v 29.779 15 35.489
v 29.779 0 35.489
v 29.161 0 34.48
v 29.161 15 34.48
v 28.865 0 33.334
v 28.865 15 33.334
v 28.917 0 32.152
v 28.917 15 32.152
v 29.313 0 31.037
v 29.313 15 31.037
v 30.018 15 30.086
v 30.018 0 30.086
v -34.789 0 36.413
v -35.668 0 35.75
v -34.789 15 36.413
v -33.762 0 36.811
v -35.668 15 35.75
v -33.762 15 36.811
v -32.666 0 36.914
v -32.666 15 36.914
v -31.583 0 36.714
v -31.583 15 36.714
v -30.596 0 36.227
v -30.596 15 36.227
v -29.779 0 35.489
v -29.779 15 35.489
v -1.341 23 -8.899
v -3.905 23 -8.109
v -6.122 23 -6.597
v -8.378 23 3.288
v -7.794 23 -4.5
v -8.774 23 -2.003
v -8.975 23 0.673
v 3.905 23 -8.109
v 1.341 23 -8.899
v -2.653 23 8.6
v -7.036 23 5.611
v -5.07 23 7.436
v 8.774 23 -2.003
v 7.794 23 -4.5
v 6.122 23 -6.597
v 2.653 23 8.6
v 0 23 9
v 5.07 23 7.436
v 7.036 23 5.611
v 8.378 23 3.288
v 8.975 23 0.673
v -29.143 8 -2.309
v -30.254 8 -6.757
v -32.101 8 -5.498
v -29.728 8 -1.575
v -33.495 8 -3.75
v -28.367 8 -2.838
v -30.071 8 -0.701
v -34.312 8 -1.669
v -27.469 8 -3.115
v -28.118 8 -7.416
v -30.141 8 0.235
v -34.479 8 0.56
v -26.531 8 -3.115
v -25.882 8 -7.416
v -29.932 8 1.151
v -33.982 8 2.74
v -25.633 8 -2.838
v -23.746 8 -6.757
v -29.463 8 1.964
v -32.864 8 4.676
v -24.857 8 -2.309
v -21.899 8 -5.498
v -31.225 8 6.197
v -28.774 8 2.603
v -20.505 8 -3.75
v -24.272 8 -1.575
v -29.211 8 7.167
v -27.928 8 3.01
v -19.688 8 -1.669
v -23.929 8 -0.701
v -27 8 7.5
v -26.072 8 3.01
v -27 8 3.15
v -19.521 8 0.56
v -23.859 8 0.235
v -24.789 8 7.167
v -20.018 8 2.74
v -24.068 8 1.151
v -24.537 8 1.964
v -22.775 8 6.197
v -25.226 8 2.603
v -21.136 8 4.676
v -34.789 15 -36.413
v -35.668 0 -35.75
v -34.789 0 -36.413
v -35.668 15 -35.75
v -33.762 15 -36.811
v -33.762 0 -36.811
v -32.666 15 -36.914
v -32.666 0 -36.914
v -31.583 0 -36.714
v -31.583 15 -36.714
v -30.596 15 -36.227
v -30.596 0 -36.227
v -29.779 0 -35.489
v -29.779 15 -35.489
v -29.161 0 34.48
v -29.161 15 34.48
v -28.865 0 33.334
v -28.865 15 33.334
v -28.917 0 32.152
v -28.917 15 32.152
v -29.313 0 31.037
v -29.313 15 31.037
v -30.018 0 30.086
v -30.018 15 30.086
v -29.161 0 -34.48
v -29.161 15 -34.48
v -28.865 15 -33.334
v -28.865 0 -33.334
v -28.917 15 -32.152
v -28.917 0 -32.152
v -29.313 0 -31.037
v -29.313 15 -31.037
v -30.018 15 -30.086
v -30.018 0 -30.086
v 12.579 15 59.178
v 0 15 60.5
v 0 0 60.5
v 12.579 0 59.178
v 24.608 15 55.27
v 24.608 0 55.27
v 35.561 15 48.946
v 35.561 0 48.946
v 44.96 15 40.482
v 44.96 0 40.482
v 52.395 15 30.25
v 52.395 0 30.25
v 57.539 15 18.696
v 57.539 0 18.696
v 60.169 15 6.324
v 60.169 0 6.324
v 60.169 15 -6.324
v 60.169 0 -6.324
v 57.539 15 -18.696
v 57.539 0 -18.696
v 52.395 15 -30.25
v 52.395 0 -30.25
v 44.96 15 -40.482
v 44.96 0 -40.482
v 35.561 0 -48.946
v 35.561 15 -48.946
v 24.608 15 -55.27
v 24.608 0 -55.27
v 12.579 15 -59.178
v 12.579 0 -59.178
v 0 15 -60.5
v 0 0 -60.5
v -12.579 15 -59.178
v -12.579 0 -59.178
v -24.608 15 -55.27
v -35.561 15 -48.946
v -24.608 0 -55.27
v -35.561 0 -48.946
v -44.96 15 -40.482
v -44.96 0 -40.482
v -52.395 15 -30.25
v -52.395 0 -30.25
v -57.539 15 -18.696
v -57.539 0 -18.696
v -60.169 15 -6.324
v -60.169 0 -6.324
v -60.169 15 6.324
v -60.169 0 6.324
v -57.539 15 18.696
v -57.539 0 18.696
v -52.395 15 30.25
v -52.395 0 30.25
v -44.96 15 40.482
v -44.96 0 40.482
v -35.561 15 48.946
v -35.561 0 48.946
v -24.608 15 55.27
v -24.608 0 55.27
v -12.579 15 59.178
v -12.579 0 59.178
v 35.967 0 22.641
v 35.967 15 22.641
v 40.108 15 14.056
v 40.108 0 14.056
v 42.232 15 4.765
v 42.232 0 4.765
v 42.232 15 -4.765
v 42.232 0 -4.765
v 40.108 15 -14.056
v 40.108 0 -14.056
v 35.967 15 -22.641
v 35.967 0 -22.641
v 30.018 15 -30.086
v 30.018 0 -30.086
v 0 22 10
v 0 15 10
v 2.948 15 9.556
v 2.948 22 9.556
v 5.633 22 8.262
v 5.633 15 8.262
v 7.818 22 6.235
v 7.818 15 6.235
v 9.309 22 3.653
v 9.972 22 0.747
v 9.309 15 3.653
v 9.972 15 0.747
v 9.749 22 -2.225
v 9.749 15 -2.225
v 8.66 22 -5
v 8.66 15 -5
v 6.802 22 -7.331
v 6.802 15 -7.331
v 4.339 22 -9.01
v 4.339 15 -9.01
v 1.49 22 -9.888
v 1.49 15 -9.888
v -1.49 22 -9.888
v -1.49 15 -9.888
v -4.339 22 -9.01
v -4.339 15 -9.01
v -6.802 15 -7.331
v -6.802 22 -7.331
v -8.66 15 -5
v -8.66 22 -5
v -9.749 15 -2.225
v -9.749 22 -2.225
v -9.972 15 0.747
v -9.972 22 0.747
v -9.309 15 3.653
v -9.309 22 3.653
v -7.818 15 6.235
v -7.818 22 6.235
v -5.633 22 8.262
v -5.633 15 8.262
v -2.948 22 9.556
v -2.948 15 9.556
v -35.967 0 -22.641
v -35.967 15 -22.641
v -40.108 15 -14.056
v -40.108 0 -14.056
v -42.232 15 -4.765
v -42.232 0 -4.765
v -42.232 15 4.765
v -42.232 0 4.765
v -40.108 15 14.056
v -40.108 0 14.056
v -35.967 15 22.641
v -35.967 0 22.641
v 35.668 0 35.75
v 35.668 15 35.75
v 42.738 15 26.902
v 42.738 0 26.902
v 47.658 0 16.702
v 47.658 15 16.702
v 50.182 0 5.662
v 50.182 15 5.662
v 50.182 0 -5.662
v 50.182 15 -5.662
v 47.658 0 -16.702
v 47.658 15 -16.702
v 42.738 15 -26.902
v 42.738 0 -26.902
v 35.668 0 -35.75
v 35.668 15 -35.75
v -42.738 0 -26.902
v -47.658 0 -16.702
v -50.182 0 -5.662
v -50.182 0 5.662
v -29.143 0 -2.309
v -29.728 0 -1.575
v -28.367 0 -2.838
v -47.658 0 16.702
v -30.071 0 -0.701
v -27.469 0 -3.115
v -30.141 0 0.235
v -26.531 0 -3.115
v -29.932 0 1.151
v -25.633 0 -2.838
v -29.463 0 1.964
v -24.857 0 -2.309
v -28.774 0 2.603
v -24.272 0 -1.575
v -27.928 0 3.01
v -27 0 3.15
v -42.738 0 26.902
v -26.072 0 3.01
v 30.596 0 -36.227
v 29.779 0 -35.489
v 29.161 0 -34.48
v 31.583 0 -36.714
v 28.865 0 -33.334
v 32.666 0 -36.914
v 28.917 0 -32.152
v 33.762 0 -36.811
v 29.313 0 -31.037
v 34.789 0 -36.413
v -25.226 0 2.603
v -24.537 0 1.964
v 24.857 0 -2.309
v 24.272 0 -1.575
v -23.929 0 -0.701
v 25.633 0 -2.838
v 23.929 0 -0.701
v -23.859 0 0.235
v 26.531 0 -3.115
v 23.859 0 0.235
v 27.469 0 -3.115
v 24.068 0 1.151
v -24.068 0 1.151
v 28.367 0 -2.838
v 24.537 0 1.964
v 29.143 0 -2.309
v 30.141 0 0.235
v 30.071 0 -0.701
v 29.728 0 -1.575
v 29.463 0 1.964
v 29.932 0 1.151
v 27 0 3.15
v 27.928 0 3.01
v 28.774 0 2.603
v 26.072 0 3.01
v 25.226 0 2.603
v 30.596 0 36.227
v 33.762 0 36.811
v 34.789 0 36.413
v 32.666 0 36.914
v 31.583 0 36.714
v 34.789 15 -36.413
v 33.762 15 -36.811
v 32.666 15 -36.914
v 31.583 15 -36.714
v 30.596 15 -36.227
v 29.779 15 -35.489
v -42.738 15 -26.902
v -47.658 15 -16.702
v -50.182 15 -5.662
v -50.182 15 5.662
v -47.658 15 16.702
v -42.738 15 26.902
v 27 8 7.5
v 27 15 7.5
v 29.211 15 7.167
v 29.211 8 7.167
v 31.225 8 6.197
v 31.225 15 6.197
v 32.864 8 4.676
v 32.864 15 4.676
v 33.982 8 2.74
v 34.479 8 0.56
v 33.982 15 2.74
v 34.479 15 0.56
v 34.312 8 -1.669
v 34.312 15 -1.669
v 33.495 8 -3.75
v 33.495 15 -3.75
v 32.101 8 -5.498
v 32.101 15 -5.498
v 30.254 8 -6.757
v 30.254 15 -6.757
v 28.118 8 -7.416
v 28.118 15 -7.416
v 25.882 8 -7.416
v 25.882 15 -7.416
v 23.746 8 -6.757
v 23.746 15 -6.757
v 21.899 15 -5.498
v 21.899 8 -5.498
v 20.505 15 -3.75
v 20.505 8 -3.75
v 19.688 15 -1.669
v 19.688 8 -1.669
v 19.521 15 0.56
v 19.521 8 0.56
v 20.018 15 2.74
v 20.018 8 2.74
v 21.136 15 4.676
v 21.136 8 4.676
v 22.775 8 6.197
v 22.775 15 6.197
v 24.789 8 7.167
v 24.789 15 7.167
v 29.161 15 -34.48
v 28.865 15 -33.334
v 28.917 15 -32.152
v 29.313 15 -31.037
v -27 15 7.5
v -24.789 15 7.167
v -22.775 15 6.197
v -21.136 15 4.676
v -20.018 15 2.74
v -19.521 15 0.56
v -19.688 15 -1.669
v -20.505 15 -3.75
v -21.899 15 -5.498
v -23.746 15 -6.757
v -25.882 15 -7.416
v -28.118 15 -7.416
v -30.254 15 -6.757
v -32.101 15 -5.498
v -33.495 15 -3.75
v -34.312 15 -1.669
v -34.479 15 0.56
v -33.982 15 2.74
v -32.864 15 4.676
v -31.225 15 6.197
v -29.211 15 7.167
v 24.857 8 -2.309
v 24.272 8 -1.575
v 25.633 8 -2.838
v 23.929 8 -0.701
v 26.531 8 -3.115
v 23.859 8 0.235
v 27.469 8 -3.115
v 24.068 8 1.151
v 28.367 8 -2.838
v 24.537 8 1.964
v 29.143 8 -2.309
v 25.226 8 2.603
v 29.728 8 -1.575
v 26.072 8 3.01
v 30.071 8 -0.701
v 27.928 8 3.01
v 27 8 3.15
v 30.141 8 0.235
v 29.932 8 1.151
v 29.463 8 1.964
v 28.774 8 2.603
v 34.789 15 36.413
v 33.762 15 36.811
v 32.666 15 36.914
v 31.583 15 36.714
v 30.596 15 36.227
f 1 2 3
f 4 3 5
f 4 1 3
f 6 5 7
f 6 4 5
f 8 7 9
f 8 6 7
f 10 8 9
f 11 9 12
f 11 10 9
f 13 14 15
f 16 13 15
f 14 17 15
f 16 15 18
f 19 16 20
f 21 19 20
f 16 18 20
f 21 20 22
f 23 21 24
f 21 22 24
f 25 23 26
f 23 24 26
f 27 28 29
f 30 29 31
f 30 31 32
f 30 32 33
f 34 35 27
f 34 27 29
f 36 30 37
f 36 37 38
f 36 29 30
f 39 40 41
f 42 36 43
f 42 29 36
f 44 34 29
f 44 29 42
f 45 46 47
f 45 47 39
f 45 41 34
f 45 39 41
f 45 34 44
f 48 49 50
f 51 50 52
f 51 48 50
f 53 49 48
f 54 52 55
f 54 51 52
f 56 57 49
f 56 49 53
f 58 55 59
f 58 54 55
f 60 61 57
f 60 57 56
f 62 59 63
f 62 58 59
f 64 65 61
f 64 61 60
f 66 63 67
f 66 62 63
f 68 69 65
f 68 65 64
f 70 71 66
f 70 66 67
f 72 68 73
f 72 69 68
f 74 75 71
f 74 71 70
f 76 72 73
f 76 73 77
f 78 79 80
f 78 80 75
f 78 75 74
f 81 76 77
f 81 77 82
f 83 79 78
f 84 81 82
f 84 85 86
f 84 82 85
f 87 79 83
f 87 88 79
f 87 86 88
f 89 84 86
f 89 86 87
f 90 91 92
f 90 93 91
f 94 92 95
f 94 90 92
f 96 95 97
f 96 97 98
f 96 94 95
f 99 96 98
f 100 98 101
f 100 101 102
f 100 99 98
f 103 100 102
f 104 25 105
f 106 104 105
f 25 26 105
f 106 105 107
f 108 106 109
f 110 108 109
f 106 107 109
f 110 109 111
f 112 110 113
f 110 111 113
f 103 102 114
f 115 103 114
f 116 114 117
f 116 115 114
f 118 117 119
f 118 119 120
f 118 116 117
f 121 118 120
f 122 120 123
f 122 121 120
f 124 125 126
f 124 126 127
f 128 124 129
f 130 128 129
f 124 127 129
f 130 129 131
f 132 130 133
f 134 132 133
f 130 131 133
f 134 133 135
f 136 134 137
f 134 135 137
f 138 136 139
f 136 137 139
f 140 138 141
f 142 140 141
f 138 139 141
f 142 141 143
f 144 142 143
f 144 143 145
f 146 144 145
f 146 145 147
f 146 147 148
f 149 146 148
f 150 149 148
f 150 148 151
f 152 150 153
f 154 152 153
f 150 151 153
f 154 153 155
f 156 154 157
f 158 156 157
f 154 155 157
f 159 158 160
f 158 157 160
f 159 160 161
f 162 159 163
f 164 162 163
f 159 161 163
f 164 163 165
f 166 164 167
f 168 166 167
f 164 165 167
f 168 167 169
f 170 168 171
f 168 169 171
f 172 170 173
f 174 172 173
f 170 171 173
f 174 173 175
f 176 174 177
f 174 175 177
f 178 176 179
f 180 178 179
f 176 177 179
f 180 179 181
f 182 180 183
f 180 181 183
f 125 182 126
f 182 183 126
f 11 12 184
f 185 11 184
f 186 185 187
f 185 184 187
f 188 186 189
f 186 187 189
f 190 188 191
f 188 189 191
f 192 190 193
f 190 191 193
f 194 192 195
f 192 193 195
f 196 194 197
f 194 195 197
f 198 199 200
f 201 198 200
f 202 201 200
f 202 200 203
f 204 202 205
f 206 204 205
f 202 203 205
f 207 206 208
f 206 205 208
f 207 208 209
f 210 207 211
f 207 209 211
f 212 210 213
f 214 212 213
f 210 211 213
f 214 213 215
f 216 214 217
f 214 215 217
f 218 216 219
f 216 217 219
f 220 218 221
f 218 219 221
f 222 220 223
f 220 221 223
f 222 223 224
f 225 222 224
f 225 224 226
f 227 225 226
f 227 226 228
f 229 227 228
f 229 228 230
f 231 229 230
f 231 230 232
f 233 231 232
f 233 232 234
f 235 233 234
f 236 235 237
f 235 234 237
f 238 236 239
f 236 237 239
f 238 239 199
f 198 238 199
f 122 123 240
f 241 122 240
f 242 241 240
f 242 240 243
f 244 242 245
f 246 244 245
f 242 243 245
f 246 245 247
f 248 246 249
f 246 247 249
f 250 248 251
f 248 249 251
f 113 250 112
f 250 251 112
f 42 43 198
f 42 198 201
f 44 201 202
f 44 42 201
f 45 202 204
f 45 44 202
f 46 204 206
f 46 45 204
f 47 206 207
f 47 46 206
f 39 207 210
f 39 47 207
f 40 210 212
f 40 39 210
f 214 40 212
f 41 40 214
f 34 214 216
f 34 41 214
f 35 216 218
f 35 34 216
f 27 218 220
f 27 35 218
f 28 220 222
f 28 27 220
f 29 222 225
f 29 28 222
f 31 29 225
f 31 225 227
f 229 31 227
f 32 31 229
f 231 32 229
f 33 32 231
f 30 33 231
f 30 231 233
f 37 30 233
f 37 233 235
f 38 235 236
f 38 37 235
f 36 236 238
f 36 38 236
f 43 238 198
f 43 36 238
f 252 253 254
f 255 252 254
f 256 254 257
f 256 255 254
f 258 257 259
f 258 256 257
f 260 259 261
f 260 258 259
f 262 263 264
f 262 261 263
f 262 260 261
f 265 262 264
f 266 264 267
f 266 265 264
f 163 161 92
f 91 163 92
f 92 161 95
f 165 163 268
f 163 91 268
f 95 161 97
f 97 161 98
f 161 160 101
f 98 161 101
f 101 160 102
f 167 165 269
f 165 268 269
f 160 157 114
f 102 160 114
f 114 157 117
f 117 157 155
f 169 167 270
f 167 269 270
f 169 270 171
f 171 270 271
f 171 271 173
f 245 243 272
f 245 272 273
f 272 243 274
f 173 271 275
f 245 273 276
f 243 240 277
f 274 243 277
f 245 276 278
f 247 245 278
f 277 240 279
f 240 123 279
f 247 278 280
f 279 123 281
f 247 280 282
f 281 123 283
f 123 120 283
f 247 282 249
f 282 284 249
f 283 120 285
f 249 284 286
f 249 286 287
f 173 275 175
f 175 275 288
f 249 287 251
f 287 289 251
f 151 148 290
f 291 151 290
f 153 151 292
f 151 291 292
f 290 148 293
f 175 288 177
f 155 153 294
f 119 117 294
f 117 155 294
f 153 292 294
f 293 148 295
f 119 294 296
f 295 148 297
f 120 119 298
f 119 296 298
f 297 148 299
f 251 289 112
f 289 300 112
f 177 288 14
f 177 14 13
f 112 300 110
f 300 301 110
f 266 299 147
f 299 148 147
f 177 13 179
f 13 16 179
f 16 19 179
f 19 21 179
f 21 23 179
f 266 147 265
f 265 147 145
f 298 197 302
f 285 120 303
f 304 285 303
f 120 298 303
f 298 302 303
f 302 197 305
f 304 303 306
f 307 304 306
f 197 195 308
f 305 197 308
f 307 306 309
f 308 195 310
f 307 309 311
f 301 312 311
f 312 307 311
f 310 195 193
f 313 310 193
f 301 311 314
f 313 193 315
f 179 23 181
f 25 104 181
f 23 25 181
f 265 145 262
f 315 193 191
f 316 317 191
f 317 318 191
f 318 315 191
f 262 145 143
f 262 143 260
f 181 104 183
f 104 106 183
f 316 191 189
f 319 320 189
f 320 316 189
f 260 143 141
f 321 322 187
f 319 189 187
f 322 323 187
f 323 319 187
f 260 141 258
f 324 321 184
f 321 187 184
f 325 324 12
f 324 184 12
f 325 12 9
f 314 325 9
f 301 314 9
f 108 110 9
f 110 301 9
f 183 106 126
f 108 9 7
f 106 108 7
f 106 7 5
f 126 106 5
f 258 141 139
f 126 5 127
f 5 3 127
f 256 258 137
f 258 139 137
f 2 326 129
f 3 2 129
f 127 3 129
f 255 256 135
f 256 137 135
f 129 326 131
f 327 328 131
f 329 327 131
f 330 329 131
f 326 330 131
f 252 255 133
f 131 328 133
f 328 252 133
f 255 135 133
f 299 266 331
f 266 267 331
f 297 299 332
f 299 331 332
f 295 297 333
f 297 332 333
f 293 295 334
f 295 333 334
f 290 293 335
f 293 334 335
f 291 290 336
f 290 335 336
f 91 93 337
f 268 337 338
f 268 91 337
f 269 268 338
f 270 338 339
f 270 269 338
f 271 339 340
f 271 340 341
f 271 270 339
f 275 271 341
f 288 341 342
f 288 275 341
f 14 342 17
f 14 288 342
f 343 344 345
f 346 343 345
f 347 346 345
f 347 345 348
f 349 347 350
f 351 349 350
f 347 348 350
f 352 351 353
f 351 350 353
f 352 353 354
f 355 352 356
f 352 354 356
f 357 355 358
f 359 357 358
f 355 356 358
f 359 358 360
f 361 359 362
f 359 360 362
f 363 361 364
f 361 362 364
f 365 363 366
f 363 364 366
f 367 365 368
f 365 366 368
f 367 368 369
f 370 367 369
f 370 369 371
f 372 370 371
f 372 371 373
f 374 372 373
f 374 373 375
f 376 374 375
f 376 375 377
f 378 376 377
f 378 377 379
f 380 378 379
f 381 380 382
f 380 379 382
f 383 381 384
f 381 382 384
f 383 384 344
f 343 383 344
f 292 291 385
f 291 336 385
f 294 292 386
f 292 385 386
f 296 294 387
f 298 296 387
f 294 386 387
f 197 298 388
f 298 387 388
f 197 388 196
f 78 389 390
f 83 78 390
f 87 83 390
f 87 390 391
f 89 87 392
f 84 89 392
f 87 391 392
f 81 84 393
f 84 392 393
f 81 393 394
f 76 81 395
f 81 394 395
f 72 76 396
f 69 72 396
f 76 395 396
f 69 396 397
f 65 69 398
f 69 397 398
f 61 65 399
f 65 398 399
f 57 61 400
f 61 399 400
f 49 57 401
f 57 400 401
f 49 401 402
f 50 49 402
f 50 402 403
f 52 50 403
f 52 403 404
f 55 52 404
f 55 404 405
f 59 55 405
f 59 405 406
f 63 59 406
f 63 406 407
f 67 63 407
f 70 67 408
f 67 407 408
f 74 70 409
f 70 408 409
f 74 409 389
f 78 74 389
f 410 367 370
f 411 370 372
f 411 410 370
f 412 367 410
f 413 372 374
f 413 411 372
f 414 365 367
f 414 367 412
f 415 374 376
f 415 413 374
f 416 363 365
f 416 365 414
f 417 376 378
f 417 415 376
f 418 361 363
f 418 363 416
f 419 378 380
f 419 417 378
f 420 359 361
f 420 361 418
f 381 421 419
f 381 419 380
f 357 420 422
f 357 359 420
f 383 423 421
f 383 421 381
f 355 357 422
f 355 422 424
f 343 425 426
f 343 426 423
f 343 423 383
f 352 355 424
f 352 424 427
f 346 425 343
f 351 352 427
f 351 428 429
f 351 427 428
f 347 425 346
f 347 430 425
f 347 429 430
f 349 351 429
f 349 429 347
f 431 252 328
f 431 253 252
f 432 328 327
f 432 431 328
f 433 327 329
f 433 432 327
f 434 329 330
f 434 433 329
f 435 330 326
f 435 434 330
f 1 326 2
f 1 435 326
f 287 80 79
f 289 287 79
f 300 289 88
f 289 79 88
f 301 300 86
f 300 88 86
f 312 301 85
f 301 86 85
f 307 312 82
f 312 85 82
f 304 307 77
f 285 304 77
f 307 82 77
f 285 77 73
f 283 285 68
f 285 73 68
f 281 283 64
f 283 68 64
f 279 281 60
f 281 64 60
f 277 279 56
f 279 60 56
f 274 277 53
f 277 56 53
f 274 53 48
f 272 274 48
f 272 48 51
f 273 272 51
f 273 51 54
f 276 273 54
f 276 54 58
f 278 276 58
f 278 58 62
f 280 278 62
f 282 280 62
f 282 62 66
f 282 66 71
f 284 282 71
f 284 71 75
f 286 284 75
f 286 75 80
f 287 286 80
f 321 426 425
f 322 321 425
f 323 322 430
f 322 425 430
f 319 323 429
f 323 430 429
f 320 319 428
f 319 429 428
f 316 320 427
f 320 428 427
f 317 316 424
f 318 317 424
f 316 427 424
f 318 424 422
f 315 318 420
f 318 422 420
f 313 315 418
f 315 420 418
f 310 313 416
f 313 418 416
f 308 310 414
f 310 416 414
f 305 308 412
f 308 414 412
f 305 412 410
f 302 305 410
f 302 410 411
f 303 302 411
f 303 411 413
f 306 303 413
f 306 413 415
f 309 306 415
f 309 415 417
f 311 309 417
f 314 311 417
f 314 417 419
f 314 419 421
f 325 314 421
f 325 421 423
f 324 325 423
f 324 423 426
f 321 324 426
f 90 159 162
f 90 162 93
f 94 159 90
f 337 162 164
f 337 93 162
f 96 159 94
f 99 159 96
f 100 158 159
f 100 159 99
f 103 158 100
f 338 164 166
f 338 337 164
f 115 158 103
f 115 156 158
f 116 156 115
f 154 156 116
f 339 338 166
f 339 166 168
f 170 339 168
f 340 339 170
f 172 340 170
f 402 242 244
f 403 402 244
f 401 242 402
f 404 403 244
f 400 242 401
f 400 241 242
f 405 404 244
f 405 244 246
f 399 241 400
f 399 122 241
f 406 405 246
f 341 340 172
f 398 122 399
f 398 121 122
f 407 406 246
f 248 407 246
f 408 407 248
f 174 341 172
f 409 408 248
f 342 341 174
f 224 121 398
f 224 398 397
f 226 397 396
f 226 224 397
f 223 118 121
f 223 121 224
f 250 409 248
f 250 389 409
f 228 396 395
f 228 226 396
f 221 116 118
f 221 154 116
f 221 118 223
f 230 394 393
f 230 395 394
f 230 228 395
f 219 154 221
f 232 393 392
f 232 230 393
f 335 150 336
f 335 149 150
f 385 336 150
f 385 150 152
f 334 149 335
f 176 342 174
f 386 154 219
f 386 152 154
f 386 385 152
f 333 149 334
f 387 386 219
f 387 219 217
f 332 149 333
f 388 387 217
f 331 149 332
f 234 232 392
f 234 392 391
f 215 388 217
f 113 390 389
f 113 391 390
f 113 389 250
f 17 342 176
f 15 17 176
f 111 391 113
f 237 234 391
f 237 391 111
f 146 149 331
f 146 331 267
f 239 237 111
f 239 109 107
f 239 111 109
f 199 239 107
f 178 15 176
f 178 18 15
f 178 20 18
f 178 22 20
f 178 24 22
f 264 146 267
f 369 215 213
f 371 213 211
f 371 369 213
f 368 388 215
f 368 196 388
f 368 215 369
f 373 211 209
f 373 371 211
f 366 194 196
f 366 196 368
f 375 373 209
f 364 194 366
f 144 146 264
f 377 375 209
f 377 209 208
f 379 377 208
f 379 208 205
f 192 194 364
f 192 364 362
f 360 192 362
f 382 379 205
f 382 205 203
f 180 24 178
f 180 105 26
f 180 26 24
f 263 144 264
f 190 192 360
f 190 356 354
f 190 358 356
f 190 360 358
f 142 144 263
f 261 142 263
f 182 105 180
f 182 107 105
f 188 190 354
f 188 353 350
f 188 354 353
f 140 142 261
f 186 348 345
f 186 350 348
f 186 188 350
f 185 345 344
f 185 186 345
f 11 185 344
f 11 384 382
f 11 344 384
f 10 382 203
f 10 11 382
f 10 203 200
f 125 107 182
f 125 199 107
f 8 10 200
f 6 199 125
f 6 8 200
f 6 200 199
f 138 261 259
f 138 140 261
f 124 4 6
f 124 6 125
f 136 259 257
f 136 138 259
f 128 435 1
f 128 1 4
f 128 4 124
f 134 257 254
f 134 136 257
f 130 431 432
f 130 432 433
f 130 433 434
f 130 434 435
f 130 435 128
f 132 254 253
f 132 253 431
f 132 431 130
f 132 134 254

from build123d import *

# Parameters (mm, degrees)
SKETCH1_R           = 60.5
SKETCH1_R_2         = 50.5
SKETCH1_R_3         = 42.5
BOSS_EXTRUDE1_DEPTH = 15
SKETCH2_R           = 7.5
CUT_EXTRUDE1_DEPTH  = 7
SKETCH3_R           = 3.15
CUT_EXTRUDE2_DEPTH  = 15
FILLET1_R           = 4
SKETCH4_R           = 10
BOSS_EXTRUDE2_DEPTH = 8
CHAMFER1_SIZE       = 1


with BuildPart() as part:
    # Sketch1 → Boss-Extrude1 (new body)
    # profile 1 of 4: a face of its own
    with BuildSketch(Plane(origin=(0, 0, 0), x_dir=(1, 0, 0), z_dir=(0, 1, 0))):
        with Locations(Location((0, 0, 0), (0, 0, 270))):
            Circle(SKETCH1_R)
        Circle(SKETCH1_R_2, mode=Mode.SUBTRACT)
    # profile 2 of 4: a face of its own
    with BuildSketch(Plane(origin=(0, 0, 0), x_dir=(1, 0, 0), z_dir=(0, 1, 0))):
        with BuildLine():
            ThreePointArc((-27.318473412, 32.556888833), (0, 42.5), (27.318473412, 32.556888833))
            Line((27.318473412, 32.556888833), (32.460774289, 38.685244378))
            ThreePointArc((32.460774289, 38.685244378), (0, 50.5), (-32.460774289, 38.685244378))
            Line((-32.460774289, 38.685244378), (-27.318473412, 32.556888833))
        make_face()
    # profile 3 of 4: a face of its own
    with BuildSketch(Plane(origin=(0, 0, 0), x_dir=(1, 0, 0), z_dir=(0, 1, 0))):
        Circle(SKETCH1_R_3)
    # profile 4 of 4: a face of its own
    with BuildSketch(Plane(origin=(0, 0, 0), x_dir=(1, 0, 0), z_dir=(0, 1, 0))):
        with BuildLine():
            Line((32.460774289, -38.685244378), (27.318473412, -32.556888833))
            ThreePointArc((27.318473412, -32.556888833), (0, -42.5), (-27.318473412, -32.556888833))
            Line((-27.318473412, -32.556888833), (-32.460774289, -38.685244378))
            ThreePointArc((-32.460774289, -38.685244378), (0, -50.5), (32.460774289, -38.685244378))
        make_face()
    extrude(amount=BOSS_EXTRUDE1_DEPTH)

    # Sketch2 → Cut-Extrude1 (cut)
    with BuildSketch(Plane(origin=(0, 15, 0), x_dir=(1, 0, 0), z_dir=(0, 1, 0))):
        with Locations(Location((-27, 0, 0), (0, 0, 270))):
            Circle(SKETCH2_R)
        with Locations(Location((27, 0, 0), (0, 0, 270))):
            Circle(SKETCH2_R)
    extrude(amount=-CUT_EXTRUDE1_DEPTH, mode=Mode.SUBTRACT)

    # Sketch3 → Cut-Extrude2 (cut)
    with BuildSketch(Plane(origin=(0, 15, 0), x_dir=(1, 0, 0), z_dir=(0, 1, 0))):
        with Locations(Location((-27, 0, 0), (0, 0, 270))):
            Circle(SKETCH3_R)
        with Locations(Location((27, 0, 0), (0, 0, 270))):
            Circle(SKETCH3_R)
    extrude(amount=-CUT_EXTRUDE2_DEPTH, mode=Mode.SUBTRACT)

    # Fillet1
    fillet1_edges = [part.edges().sort_by_distance(p)[0] for p in [
        (32.460774289, 7.5, 38.685244378),
        (27.318473412, 7.5, 32.556888833),
        (-27.318473412, 7.5, 32.556888833),
        (-32.460774289, 7.5, 38.685244378),
        (32.460774289, 7.5, -38.685244378),
        (27.318473412, 7.5, -32.556888833),
        (-27.318473412, 7.5, -32.556888833),
        (-32.460774289, 7.5, -38.685244378),
    ]]
    fillet(fillet1_edges, radius=FILLET1_R - 0.0001)  # a hair under: the kernel refuses the full size

    # Sketch4 → Boss-Extrude2 (add)
    with BuildSketch(Plane(origin=(0, 15, 0), x_dir=(1, 0, 0), z_dir=(0, 1, 0))):
        with Locations(Location((0, 0, 0), (0, 0, 270))):
            Circle(SKETCH4_R)
    extrude(amount=BOSS_EXTRUDE2_DEPTH)

    # Chamfer1
    chamfer1_edges = [part.edges().sort_by_distance(p)[0] for p in [
        (0, 23, -10),
    ]]
    chamfer(chamfer1_edges, length=CHAMFER1_SIZE)


solid = part.part
